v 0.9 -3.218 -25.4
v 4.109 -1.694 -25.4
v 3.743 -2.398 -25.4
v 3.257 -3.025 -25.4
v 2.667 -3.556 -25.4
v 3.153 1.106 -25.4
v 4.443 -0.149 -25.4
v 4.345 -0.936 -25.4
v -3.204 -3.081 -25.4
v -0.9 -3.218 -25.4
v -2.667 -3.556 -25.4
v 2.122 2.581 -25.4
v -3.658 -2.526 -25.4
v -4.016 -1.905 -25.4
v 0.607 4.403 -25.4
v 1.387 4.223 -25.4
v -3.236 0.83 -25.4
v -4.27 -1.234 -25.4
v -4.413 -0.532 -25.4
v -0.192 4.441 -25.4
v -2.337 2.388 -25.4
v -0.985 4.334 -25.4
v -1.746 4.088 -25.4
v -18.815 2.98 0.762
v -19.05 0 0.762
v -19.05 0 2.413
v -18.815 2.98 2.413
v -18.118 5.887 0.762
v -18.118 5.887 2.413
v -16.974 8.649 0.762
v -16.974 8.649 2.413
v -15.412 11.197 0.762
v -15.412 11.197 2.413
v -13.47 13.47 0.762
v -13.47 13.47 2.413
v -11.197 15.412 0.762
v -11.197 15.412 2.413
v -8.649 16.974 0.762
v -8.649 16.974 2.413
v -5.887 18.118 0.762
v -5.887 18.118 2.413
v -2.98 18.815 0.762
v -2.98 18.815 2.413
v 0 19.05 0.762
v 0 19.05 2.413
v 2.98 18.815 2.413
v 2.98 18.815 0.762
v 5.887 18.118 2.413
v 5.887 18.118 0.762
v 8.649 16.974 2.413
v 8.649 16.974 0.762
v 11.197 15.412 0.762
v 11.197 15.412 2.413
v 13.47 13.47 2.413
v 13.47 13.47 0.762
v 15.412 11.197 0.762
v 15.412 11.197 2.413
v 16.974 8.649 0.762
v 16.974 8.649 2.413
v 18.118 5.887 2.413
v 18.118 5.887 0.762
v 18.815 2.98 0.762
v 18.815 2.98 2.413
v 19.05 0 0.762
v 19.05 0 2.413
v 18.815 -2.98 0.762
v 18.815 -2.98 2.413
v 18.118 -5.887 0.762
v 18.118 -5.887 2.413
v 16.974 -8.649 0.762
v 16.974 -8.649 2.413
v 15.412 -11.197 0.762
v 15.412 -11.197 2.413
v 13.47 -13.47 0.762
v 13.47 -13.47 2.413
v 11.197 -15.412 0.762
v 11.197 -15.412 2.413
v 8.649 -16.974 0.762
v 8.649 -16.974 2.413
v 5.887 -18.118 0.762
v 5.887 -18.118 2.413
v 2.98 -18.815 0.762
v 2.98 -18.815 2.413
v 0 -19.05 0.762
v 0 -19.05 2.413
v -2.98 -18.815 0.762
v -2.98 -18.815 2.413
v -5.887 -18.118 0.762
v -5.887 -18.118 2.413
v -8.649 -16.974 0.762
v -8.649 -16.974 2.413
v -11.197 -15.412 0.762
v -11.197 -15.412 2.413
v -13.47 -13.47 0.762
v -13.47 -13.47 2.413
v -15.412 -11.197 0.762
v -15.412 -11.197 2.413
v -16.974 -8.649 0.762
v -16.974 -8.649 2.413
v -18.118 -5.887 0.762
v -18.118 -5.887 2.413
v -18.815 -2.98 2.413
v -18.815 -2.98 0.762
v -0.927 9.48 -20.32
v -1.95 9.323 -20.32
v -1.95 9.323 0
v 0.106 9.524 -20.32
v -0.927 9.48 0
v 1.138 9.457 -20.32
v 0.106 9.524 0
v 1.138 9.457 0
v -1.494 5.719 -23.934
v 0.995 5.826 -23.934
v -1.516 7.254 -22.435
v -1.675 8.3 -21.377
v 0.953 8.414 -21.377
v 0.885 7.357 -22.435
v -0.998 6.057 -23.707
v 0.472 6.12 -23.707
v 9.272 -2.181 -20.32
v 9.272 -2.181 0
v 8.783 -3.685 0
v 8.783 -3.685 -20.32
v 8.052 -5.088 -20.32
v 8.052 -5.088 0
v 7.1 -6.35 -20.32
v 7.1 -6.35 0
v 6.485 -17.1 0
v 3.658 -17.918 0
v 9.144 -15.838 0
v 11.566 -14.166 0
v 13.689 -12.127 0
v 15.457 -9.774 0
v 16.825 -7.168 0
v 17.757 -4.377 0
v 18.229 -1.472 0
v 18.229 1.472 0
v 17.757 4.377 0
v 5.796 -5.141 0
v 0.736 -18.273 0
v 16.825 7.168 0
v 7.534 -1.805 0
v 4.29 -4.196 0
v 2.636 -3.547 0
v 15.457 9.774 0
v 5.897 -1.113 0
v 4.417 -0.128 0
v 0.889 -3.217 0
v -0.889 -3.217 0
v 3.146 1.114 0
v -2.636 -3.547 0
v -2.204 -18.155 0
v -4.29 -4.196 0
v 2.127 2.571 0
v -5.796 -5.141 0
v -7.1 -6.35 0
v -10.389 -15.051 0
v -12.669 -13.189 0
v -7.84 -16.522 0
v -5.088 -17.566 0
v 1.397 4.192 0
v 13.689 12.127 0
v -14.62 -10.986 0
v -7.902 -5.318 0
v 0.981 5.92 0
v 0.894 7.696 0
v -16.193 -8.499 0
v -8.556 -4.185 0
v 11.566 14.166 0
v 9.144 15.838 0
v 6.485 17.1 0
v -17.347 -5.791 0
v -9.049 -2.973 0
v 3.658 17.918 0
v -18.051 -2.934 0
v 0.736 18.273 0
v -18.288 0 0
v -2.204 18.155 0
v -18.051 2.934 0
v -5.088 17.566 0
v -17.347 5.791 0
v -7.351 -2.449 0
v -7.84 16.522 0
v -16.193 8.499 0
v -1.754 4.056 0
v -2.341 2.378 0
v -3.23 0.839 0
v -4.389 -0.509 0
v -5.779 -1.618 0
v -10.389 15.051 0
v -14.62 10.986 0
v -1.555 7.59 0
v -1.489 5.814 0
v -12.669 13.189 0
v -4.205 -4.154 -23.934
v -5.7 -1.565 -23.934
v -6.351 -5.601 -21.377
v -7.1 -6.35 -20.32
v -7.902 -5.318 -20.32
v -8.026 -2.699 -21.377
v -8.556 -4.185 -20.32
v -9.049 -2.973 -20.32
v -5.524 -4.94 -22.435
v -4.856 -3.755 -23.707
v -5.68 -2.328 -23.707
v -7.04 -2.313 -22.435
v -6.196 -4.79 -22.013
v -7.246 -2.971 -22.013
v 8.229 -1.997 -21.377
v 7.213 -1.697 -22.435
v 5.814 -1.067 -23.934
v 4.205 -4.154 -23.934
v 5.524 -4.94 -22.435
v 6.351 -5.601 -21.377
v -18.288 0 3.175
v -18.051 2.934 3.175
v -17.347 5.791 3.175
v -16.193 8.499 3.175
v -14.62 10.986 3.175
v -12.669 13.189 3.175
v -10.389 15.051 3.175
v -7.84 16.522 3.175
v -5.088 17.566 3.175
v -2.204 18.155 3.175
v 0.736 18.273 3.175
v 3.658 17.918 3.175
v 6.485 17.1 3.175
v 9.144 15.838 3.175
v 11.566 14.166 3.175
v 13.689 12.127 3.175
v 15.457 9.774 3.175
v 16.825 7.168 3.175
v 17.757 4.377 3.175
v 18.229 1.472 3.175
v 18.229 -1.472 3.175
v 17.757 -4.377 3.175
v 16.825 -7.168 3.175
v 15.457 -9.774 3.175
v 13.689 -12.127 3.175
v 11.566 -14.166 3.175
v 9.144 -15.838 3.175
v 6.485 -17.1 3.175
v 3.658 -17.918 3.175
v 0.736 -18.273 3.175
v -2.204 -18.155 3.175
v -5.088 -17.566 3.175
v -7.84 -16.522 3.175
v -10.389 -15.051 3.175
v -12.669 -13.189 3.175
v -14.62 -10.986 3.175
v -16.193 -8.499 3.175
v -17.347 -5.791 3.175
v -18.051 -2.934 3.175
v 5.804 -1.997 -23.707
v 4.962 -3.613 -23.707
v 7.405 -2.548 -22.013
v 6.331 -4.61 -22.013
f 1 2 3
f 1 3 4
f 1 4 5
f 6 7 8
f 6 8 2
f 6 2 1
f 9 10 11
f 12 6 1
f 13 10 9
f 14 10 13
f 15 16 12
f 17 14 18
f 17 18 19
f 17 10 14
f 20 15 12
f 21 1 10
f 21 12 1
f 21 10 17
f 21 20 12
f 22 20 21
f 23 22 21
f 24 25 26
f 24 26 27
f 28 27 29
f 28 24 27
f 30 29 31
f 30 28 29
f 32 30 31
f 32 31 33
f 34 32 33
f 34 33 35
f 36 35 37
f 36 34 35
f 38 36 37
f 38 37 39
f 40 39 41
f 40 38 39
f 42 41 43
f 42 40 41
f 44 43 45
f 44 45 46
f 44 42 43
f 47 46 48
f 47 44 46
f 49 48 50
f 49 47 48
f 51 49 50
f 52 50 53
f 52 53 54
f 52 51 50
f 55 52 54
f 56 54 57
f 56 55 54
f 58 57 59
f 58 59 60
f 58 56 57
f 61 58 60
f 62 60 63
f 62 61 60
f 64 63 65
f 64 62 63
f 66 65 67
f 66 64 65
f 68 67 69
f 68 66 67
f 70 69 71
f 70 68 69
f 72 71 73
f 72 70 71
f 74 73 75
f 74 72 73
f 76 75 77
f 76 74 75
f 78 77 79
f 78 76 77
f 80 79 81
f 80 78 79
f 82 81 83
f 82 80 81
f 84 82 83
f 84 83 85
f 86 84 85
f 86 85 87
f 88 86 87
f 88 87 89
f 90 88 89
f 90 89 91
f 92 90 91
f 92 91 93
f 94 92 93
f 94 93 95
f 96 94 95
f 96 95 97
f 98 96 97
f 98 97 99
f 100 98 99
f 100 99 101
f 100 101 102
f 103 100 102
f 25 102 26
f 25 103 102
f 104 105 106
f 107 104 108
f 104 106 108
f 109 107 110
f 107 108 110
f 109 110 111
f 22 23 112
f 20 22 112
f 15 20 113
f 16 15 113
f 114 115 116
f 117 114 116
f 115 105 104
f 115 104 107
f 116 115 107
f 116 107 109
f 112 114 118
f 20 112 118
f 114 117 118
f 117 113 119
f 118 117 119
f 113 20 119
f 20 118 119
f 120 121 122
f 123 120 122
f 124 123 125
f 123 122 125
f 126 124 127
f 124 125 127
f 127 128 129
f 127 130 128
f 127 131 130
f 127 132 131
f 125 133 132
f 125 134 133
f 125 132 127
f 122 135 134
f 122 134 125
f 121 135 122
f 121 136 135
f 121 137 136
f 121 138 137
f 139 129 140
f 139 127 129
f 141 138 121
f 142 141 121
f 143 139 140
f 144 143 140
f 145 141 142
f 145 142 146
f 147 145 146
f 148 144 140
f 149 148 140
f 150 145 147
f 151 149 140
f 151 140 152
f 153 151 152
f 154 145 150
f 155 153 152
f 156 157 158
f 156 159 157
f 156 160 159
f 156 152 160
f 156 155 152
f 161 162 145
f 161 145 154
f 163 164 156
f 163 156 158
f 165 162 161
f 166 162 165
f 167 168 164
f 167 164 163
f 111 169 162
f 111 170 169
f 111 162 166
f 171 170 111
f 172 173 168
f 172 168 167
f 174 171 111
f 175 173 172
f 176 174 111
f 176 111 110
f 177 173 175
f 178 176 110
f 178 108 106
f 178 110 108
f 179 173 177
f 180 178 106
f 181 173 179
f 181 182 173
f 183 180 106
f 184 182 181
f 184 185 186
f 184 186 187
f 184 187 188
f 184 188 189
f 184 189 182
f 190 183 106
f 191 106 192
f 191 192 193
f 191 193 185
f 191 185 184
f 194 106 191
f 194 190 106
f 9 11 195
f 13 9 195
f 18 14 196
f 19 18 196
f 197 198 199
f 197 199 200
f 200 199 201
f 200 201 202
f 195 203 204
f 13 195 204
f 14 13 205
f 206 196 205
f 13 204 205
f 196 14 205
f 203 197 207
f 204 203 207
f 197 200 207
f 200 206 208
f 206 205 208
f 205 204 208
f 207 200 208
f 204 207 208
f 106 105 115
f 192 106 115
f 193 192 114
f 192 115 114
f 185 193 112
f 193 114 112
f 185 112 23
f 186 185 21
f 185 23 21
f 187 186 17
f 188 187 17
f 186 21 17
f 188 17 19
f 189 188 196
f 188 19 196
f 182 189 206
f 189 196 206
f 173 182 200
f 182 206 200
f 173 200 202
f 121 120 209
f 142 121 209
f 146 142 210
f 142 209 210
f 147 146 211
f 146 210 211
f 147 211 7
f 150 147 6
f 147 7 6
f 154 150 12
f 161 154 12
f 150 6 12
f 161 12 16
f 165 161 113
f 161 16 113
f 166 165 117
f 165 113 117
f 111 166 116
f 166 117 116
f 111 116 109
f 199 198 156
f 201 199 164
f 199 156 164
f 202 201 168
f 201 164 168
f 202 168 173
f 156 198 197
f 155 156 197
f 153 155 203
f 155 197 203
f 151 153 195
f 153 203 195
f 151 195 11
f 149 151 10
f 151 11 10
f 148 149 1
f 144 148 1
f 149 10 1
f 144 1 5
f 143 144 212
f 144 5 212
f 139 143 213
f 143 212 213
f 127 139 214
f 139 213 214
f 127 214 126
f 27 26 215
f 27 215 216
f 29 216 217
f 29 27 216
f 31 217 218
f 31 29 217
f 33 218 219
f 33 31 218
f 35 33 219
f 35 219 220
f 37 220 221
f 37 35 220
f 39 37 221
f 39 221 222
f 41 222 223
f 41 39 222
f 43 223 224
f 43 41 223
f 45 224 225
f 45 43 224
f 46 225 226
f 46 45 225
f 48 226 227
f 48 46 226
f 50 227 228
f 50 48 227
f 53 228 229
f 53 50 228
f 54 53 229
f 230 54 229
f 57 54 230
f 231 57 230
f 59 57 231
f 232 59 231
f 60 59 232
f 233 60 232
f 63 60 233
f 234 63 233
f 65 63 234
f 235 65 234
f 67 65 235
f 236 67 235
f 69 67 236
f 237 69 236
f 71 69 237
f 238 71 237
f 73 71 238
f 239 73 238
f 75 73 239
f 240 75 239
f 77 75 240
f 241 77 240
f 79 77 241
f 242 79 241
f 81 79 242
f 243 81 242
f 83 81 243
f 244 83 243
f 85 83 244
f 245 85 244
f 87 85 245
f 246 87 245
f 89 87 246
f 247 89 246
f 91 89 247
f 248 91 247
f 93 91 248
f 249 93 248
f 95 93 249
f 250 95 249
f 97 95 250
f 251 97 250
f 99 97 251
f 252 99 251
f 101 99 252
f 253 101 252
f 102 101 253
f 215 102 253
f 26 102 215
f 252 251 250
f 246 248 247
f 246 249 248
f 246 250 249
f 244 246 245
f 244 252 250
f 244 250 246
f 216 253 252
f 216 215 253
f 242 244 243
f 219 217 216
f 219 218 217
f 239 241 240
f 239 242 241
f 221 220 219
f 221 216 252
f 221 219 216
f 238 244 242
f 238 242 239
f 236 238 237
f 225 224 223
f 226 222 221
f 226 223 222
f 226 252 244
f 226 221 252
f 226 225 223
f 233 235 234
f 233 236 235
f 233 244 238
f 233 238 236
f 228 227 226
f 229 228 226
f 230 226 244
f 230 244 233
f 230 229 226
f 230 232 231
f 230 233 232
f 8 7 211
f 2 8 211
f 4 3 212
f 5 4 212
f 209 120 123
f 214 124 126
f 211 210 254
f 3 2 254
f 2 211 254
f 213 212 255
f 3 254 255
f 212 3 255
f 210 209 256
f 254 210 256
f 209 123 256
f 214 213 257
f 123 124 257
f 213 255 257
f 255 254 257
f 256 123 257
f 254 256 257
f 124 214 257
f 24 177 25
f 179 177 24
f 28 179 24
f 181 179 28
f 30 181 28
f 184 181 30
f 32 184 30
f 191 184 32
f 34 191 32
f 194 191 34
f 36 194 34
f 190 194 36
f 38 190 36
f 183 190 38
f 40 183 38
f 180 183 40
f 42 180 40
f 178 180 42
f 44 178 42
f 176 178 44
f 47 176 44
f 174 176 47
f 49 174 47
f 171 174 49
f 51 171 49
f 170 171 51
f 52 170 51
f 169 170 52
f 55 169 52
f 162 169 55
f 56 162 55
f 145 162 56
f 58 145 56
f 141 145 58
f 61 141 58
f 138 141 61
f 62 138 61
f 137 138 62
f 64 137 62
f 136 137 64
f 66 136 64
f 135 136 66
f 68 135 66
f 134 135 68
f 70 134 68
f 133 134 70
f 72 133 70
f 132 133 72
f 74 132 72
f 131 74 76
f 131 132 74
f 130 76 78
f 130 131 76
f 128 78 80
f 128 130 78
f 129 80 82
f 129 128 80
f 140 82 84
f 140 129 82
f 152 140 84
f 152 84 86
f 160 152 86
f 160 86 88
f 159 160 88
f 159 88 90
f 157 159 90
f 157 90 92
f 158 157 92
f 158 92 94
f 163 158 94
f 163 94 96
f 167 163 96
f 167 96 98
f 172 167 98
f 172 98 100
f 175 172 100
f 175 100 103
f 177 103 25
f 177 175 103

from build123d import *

# Parameters (mm, degrees)
F0_W     = 9.525
F0_H     = 25.4
F2_SIZE  = 0.762
F3_R     = 9.525
F4_DEPTH = 25.4
F5_SIZE  = 5.08


with BuildPart() as f1:
    # F0 (on Front) → F1 (revolve)
    with BuildSketch(Plane.XZ):
        with Locations((-4.7625, -12.7)):
            Rectangle(F0_W, F0_H)
        Polygon((-9.525, 0), (0, 0), (0, 3.175), (-19.05, 3.175), (-19.05, 0), align=None)
    revolve(axis=Axis((0, 0, -12.7), (0, 0, -1)))

    # F2
    f2_edges = [f1.edges().sort_by_distance(p)[0] for p in [
        (19.05, 0, 0),
        (19.05, 0, 3.175),
    ]]
    chamfer(f2_edges, length=F2_SIZE)

    # F3 (on face) → F4 (cut, through all)
    with BuildSketch(Plane(origin=(0, 0, -25.4), x_dir=(1, 0, 0), z_dir=(0, 0, -1))):
        with Locations((0, 12.7)):
            Circle(F3_R)
        with Locations((-10.9985226281, -6.35)):
            Circle(F3_R)
        with Locations((10.4095544736, -7.2753814788)):
            Circle(F3_R)
    extrude(amount=-F4_DEPTH, mode=Mode.SUBTRACT)

    # F5
    f5_edges = [f1.edges().sort_by_distance(p)[0] for p in [
        (-8.248892, -4.7625, -25.4),
        (-0.411342, 9.516114, -25.4),
        (8.446867, -4.401825, -25.4),
    ]]
    chamfer(f5_edges, length=F5_SIZE)


solid = f1.part
